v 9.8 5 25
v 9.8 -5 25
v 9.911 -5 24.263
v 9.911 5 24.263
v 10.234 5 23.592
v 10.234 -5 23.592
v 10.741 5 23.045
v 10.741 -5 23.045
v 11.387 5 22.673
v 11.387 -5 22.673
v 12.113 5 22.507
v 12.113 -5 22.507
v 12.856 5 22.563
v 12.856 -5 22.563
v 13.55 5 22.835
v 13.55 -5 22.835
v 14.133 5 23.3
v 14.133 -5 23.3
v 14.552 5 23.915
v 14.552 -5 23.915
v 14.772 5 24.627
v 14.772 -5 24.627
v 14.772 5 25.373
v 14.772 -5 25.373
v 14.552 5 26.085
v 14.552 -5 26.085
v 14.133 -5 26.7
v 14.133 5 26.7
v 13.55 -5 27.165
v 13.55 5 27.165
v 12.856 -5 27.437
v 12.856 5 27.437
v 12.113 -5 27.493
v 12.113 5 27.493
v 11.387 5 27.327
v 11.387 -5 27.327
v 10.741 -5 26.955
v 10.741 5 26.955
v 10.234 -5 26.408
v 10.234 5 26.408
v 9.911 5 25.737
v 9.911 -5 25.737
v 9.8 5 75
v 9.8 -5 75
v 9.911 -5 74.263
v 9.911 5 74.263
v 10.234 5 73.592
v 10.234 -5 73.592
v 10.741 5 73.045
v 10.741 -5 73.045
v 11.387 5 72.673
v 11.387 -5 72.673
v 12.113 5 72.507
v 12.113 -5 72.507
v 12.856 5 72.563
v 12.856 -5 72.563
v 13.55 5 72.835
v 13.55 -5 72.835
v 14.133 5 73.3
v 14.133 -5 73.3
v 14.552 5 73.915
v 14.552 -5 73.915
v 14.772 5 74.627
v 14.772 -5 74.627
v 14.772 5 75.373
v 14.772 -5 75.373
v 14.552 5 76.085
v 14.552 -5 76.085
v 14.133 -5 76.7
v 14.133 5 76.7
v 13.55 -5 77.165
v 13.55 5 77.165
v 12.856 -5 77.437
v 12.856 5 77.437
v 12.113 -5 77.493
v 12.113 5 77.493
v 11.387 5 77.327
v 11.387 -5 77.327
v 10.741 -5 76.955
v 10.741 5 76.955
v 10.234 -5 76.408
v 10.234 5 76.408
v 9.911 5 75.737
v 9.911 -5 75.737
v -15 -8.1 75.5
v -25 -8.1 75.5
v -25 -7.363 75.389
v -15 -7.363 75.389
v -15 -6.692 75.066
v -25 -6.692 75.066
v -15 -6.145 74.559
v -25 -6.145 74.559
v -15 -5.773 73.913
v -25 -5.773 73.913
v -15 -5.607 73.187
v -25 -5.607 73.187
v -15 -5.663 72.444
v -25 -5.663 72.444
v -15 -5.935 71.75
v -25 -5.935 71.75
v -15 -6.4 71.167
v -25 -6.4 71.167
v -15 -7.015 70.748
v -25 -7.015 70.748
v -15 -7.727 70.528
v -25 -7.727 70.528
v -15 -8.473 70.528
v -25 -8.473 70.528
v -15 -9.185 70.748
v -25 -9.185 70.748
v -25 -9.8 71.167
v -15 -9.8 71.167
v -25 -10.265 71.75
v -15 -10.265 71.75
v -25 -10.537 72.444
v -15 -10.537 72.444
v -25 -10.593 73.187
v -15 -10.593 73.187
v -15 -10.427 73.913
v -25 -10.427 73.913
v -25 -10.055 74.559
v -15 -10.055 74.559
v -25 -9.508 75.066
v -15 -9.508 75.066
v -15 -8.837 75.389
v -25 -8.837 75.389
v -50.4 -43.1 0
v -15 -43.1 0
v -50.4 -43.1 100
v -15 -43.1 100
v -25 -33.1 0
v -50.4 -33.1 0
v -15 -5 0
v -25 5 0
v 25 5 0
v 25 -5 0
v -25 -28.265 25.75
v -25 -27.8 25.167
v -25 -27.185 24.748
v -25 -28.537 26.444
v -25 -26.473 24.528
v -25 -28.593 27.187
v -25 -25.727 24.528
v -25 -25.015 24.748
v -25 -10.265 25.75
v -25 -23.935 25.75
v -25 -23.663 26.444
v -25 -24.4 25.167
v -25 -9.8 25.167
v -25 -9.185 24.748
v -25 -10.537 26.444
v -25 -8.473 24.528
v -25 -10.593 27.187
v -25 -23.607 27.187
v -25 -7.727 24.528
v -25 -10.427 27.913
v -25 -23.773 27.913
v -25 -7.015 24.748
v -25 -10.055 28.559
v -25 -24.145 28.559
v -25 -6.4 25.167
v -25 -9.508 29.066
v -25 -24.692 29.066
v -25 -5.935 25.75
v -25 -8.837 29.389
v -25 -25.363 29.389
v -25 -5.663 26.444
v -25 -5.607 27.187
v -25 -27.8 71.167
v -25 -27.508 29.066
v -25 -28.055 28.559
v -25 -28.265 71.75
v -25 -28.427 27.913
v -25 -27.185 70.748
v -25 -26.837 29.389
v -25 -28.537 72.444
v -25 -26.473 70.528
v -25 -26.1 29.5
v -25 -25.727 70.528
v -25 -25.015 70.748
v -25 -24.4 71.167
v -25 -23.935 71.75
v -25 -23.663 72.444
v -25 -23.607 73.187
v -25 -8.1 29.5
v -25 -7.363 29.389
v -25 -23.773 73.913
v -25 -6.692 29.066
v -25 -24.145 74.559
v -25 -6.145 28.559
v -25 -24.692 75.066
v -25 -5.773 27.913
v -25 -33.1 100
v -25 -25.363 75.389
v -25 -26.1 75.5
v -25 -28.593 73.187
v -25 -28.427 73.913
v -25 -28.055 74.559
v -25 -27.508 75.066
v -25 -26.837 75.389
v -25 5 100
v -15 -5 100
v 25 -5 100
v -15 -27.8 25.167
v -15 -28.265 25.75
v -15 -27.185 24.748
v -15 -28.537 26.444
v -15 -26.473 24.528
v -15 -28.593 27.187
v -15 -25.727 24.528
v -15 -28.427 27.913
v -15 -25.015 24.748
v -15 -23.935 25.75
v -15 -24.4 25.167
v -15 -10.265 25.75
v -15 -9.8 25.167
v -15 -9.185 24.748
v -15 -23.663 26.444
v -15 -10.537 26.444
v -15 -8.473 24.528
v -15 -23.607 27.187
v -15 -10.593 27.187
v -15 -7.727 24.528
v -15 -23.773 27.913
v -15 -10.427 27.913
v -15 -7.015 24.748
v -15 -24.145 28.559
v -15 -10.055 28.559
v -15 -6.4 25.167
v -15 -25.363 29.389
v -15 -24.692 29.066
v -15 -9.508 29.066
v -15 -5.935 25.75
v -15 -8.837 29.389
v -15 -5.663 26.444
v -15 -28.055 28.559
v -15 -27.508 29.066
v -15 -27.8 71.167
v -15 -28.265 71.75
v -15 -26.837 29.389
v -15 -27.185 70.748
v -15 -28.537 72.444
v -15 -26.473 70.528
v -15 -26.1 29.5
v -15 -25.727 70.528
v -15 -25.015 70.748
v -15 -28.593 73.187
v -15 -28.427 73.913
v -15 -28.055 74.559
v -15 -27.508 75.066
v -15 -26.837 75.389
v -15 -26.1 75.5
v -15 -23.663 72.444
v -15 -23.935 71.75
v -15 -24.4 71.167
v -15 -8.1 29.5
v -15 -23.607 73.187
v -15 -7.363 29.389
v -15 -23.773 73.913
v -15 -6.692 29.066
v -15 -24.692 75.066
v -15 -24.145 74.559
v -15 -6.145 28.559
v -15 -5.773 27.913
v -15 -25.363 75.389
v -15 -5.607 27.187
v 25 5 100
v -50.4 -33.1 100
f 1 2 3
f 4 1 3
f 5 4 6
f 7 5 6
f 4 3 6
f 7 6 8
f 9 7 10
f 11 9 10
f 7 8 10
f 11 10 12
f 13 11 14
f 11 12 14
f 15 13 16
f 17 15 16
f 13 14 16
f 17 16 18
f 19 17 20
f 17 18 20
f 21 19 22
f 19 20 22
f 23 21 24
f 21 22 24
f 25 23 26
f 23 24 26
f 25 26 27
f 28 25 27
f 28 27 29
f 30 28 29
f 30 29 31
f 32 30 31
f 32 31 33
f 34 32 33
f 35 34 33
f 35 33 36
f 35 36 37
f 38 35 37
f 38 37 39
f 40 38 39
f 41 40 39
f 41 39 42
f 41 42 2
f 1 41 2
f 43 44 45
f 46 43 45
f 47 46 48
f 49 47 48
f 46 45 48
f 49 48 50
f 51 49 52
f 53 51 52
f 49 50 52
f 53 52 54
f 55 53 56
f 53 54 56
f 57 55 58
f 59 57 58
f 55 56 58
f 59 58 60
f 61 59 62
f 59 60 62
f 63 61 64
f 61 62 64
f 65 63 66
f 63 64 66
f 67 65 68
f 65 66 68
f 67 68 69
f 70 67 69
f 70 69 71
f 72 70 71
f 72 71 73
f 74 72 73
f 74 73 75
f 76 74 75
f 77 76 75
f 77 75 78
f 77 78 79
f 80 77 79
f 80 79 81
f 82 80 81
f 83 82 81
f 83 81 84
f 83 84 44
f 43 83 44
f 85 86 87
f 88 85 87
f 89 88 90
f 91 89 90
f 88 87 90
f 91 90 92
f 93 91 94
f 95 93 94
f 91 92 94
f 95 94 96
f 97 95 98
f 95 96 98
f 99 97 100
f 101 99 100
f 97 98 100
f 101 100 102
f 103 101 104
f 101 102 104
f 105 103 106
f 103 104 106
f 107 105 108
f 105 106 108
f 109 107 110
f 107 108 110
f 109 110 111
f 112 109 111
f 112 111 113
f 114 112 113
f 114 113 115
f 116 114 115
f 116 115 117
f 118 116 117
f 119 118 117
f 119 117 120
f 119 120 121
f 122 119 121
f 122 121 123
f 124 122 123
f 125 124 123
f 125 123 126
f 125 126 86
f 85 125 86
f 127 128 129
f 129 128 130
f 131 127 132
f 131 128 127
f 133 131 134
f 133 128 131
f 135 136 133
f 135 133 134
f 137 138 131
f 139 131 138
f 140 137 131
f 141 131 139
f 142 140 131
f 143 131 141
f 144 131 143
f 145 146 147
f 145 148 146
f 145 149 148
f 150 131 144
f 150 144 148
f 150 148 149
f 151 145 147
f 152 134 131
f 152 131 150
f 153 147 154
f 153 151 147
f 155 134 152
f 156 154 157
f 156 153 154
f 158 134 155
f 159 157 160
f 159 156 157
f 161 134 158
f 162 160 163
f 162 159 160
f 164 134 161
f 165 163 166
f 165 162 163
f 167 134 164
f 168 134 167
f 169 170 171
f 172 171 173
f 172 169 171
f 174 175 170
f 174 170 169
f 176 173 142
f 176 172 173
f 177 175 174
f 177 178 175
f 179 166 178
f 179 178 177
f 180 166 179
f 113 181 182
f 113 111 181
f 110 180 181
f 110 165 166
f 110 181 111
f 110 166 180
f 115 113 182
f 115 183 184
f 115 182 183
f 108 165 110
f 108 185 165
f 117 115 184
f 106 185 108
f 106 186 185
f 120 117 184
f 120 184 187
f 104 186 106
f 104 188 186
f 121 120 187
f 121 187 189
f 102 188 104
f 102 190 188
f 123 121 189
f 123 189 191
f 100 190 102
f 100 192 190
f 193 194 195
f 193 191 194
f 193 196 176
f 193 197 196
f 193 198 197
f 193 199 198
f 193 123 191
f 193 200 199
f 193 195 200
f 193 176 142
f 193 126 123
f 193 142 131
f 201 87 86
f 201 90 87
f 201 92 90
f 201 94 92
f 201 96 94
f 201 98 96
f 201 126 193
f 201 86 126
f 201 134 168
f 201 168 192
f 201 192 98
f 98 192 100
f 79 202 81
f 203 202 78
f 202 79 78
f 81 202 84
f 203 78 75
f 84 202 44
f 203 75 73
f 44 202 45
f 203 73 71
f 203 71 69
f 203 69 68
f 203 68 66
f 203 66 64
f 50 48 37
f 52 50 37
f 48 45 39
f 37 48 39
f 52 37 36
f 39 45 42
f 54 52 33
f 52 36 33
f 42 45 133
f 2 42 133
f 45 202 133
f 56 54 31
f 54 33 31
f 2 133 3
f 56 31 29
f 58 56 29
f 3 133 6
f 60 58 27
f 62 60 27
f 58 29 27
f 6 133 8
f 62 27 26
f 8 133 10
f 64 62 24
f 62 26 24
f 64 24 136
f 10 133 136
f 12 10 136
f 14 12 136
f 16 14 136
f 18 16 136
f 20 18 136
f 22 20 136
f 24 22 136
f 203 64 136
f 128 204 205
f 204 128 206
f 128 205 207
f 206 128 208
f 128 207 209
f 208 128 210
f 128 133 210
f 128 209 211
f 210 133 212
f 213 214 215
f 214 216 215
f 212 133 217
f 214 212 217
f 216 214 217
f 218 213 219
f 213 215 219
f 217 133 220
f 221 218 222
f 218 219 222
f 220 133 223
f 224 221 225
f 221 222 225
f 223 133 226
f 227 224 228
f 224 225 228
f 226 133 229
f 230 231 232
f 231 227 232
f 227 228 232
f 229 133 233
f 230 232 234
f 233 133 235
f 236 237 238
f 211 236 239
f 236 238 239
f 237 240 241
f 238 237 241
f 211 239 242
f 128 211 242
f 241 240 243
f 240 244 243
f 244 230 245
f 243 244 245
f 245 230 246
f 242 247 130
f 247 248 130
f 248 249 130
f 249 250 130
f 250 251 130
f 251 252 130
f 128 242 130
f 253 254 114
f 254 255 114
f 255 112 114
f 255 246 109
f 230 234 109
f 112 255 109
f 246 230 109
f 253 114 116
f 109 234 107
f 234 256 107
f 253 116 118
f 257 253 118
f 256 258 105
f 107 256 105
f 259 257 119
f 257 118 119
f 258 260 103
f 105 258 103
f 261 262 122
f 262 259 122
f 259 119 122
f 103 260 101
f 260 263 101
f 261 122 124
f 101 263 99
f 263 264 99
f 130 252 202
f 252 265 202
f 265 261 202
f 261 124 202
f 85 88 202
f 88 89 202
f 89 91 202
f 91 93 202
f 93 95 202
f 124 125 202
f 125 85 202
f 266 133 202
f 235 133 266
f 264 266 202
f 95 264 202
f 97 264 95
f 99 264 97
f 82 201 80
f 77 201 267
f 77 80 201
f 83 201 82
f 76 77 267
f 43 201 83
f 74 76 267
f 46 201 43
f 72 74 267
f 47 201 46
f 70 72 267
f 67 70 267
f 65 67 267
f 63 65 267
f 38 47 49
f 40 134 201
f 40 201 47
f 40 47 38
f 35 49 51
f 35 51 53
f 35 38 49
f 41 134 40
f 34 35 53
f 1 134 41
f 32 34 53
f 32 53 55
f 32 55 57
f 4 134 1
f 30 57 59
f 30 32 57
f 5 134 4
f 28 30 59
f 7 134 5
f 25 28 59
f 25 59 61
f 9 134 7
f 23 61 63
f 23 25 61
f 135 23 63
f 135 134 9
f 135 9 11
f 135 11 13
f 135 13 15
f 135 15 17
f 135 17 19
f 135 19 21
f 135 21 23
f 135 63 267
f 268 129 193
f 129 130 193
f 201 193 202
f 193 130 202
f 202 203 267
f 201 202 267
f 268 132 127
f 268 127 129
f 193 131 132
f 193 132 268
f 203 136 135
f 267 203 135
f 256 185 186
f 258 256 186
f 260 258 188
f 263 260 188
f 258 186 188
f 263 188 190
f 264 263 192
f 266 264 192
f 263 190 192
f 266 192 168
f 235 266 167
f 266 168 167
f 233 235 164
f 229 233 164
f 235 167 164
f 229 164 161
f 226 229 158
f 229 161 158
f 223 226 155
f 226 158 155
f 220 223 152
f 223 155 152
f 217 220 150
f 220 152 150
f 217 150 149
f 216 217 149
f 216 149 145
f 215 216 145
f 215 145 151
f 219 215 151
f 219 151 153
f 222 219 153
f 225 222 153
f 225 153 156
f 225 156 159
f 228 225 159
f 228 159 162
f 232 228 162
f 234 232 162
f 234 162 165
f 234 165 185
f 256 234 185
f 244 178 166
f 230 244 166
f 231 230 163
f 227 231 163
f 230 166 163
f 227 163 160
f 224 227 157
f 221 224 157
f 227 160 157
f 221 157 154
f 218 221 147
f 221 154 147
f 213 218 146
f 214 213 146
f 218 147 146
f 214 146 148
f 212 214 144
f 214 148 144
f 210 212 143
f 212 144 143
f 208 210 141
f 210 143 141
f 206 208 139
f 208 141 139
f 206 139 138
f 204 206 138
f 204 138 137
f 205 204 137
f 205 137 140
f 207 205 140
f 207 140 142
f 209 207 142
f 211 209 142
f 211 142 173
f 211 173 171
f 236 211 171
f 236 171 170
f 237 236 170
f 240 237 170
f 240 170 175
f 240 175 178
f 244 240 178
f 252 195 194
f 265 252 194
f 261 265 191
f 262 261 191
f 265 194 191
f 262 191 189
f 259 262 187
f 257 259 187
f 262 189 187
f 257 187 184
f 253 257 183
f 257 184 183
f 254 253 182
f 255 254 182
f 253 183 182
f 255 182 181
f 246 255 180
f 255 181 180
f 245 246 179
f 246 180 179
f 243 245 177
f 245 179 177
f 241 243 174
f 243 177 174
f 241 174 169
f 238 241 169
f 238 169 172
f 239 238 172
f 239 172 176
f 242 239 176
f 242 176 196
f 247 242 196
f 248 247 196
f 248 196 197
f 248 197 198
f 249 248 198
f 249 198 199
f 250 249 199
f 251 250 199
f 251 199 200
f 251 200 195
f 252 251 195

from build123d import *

# Parameters (mm, degrees)
SKETCH1_W             = 50
SKETCH1_H             = 10
BOSS_EXTRUDE1_DEPTH   = 100
SKETCH2_W             = 10
SKETCH2_H             = 100
BOSS_EXTRUDE2_DEPTH   = 38.1
SKETCH3_W             = 100
SKETCH3_H             = 10
BOSS_EXTRUDE3_DEPTH   = 25.4
M5X0_8_TAPPED_HOLE1_D = 5
M5X0_8_TAPPED_HOLE2_D = 5


with BuildPart() as part:
    # Sketch1 → Boss-Extrude1 (new body)
    with BuildSketch(Plane.XY):
        Rectangle(SKETCH1_W, SKETCH1_H)
    extrude(amount=BOSS_EXTRUDE1_DEPTH)

    # Sketch2 → Boss-Extrude2 (add)
    with BuildSketch(Plane.XZ.offset(5)):
        with Locations((-20, 50)):
            Rectangle(SKETCH2_W, SKETCH2_H)
    extrude(amount=BOSS_EXTRUDE2_DEPTH)

    # Sketch3 → Boss-Extrude3 (add)
    with BuildSketch(Plane.ZY.offset(25)):
        with Locations((50, -38.1)):
            Rectangle(SKETCH3_W, SKETCH3_H)
    extrude(amount=BOSS_EXTRUDE3_DEPTH)

    # M5x0.8 Tapped Hole1 (through all)
    with Locations(Plane(origin=(0, 5, 0), x_dir=(1, 0, 0), z_dir=(0, 1, 0))):
        with Locations((12.3, -75), (12.3, -25)):
            Hole(M5X0_8_TAPPED_HOLE1_D / 2)

    # M5x0.8 Tapped Hole2 (through all)
    with Locations(Plane(origin=(-15, 0, 0), x_dir=(0, 0, -1), z_dir=(1, 0, 0))):
        with Locations((-27, -8.1), (-73, -26.1), (-27, -26.1), (-73, -8.1)):
            Hole(M5X0_8_TAPPED_HOLE2_D / 2)


solid = part.part
